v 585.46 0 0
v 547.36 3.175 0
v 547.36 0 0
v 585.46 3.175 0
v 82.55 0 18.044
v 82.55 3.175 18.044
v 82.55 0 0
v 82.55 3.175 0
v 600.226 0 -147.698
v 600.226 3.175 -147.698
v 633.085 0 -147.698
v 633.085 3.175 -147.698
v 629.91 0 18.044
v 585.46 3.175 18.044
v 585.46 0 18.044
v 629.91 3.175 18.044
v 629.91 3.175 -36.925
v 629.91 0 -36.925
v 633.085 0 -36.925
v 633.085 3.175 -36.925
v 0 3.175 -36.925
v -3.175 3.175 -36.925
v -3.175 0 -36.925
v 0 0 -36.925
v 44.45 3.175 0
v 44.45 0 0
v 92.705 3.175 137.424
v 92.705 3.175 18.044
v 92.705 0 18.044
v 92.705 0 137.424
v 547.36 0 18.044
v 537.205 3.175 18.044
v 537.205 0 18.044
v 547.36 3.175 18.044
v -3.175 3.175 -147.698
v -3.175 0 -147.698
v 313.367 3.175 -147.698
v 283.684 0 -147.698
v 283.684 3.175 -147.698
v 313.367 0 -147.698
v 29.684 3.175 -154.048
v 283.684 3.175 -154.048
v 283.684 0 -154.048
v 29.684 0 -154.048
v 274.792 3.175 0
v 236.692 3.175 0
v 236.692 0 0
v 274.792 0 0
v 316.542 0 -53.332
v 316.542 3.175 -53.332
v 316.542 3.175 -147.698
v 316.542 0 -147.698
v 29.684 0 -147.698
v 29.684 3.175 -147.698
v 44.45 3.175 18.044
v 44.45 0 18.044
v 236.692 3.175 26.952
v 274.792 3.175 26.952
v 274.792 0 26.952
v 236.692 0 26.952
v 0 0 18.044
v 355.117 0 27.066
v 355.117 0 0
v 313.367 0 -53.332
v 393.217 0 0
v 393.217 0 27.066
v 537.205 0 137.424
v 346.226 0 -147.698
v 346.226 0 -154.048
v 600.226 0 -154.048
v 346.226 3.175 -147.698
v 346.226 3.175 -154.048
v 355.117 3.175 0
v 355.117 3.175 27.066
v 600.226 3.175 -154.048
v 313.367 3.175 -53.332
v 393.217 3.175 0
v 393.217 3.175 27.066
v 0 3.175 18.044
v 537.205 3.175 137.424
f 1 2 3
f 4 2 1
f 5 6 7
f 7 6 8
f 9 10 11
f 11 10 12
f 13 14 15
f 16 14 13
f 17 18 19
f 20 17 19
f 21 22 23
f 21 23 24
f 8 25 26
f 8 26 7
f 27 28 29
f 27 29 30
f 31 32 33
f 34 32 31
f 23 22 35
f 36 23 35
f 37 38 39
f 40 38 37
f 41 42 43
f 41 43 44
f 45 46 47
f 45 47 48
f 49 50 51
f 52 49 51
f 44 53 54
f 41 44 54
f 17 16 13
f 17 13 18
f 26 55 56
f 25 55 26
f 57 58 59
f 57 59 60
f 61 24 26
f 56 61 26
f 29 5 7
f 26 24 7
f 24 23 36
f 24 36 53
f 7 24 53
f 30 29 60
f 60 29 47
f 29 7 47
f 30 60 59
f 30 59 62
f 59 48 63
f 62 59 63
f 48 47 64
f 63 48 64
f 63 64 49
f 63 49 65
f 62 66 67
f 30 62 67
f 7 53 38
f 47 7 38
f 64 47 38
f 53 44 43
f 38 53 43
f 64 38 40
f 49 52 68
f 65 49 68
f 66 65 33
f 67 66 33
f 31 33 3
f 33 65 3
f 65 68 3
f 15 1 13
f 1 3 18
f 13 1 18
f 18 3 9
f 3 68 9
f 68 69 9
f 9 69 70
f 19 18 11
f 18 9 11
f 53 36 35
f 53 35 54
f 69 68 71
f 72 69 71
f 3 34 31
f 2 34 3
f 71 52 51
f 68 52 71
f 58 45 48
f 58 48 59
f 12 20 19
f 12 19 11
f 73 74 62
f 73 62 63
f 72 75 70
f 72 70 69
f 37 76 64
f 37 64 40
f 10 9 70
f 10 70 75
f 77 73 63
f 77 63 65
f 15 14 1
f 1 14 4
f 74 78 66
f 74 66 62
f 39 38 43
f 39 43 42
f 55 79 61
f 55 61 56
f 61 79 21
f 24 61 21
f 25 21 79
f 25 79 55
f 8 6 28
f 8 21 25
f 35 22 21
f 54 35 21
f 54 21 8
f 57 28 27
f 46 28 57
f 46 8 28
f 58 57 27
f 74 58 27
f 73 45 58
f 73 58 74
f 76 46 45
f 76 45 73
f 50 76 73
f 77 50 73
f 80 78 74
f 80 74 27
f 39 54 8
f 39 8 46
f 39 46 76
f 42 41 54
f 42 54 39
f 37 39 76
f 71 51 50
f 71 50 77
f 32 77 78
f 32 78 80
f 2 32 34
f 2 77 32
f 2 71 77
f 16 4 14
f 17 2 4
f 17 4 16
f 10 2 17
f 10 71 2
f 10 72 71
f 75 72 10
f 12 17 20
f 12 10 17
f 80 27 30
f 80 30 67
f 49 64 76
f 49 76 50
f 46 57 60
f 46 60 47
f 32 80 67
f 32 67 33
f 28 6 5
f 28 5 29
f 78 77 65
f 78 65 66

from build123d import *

# Parameters (mm, degrees)
SKETCH1_W           = 629.90984
SKETCH1_H           = 147.69846
BOSS_EXTRUDE1_DEPTH = 3.175
SKETCH3_W           = 254
SKETCH3_H           = 3.175
BOSS_EXTRUDE2_DEPTH = 6.35
SKETCH4_W           = 3.175
SKETCH4_H           = 188.732840052
CUT_EXTRUDE1_DEPTH  = 3.175
SKETCH6_W           = 3.175
SKETCH6_H           = 110.773845
BOSS_EXTRUDE4_DEPTH = 3.175
SKETCH8_W           = 629.90984
SKETCH8_H           = 18.04416
BOSS_EXTRUDE5_DEPTH = 3.175
SKETCH10_W          = 38.1
SKETCH10_H          = 18.04416
SKETCH10_H_2        = 36.08832
CUT_EXTRUDE3_DEPTH  = 652.56536379
BOSS_EXTRUDE6_DEPTH = 3.175


with BuildPart() as part:
    # Sketch1 → Boss-Extrude1 (new body)
    with BuildSketch(Plane(origin=(0, 0, 0), x_dir=(1, 0, 0), z_dir=(0, 1, 0))):
        with Locations((314.95492, 73.84923)):
            Rectangle(SKETCH1_W, SKETCH1_H)
    extrude(amount=BOSS_EXTRUDE1_DEPTH)

    # Sketch3 → Boss-Extrude2 (add)
    with BuildSketch(Plane(origin=(0, 0, -147.69846), x_dir=(-1, 0, 0), z_dir=(0, 0, -1))):
        with Locations((-473.22613, 1.5875)):
            Rectangle(SKETCH3_W, SKETCH3_H)
        with Locations((-156.68371, 1.5875)):
            Rectangle(SKETCH3_W, SKETCH3_H)
    extrude(amount=BOSS_EXTRUDE2_DEPTH)

    # Sketch4 → Cut-Extrude1 (cut)
    with BuildSketch(Plane(origin=(0, 3.175, 0), x_dir=(1, 0, 0), z_dir=(0, 1, 0))):
        with Locations((314.95492, 147.69846)):
            Rectangle(SKETCH4_W, SKETCH4_H)
    extrude(amount=-CUT_EXTRUDE1_DEPTH, mode=Mode.SUBTRACT)

    # Sketch6 → Boss-Extrude4 (add)
    with BuildSketch(Plane(origin=(0, 3.175, 0), x_dir=(1, 0, 0), z_dir=(0, 1, 0))):
        with Locations((631.49734, 92.3115375)):
            Rectangle(SKETCH6_W, SKETCH6_H)
        with Locations((-1.5875, 92.3115375)):
            Rectangle(SKETCH6_W, SKETCH6_H)
    extrude(amount=-BOSS_EXTRUDE4_DEPTH)

    # Sketch8 → Boss-Extrude5 (add, through all)
    with BuildSketch(Plane(origin=(0, 3.175, 0), x_dir=(1, 0, 0), z_dir=(0, 1, 0))):
        with Locations((314.95492, -9.02208)):
            Rectangle(SKETCH8_W, SKETCH8_H)
    extrude(amount=-BOSS_EXTRUDE5_DEPTH)

    # Sketch10 → Cut-Extrude3 (cut, through all)
    with BuildSketch(Plane(origin=(0, 3.175, 0), x_dir=(1, 0, 0), z_dir=(0, 1, 0))):
        with Locations((374.1674, -9.02208)):
            Rectangle(SKETCH10_W, SKETCH10_H)
        with Locations((255.74244, -9.02208)):
            Rectangle(SKETCH10_W, SKETCH10_H)
        with Locations((566.40984, -18.04416)):
            Rectangle(SKETCH10_W, SKETCH10_H_2)
        with Locations((63.5, -18.04416)):
            Rectangle(SKETCH10_W, SKETCH10_H_2)
    extrude(amount=-CUT_EXTRUDE3_DEPTH, mode=Mode.SUBTRACT)

    # Sketch11 → Boss-Extrude6 (add, through all)
    with BuildSketch(Plane(origin=(0, 3.175, 0), x_dir=(1, 0, 0), z_dir=(0, 1, 0))):
        Polygon((92.70492, -18.04416), (92.70492, -137.42416), (537.20492, -137.42416), (537.20492, -18.04416), (393.2174, -18.04416), (393.2174, -27.06624), (355.1174, -27.06624), (355.1174, -18.04416), (274.79244, -18.04416), (274.79244, -26.95194), (236.69244, -26.95194), (236.69244, -18.04416), align=None)
    extrude(amount=-BOSS_EXTRUDE6_DEPTH)


solid = part.part
